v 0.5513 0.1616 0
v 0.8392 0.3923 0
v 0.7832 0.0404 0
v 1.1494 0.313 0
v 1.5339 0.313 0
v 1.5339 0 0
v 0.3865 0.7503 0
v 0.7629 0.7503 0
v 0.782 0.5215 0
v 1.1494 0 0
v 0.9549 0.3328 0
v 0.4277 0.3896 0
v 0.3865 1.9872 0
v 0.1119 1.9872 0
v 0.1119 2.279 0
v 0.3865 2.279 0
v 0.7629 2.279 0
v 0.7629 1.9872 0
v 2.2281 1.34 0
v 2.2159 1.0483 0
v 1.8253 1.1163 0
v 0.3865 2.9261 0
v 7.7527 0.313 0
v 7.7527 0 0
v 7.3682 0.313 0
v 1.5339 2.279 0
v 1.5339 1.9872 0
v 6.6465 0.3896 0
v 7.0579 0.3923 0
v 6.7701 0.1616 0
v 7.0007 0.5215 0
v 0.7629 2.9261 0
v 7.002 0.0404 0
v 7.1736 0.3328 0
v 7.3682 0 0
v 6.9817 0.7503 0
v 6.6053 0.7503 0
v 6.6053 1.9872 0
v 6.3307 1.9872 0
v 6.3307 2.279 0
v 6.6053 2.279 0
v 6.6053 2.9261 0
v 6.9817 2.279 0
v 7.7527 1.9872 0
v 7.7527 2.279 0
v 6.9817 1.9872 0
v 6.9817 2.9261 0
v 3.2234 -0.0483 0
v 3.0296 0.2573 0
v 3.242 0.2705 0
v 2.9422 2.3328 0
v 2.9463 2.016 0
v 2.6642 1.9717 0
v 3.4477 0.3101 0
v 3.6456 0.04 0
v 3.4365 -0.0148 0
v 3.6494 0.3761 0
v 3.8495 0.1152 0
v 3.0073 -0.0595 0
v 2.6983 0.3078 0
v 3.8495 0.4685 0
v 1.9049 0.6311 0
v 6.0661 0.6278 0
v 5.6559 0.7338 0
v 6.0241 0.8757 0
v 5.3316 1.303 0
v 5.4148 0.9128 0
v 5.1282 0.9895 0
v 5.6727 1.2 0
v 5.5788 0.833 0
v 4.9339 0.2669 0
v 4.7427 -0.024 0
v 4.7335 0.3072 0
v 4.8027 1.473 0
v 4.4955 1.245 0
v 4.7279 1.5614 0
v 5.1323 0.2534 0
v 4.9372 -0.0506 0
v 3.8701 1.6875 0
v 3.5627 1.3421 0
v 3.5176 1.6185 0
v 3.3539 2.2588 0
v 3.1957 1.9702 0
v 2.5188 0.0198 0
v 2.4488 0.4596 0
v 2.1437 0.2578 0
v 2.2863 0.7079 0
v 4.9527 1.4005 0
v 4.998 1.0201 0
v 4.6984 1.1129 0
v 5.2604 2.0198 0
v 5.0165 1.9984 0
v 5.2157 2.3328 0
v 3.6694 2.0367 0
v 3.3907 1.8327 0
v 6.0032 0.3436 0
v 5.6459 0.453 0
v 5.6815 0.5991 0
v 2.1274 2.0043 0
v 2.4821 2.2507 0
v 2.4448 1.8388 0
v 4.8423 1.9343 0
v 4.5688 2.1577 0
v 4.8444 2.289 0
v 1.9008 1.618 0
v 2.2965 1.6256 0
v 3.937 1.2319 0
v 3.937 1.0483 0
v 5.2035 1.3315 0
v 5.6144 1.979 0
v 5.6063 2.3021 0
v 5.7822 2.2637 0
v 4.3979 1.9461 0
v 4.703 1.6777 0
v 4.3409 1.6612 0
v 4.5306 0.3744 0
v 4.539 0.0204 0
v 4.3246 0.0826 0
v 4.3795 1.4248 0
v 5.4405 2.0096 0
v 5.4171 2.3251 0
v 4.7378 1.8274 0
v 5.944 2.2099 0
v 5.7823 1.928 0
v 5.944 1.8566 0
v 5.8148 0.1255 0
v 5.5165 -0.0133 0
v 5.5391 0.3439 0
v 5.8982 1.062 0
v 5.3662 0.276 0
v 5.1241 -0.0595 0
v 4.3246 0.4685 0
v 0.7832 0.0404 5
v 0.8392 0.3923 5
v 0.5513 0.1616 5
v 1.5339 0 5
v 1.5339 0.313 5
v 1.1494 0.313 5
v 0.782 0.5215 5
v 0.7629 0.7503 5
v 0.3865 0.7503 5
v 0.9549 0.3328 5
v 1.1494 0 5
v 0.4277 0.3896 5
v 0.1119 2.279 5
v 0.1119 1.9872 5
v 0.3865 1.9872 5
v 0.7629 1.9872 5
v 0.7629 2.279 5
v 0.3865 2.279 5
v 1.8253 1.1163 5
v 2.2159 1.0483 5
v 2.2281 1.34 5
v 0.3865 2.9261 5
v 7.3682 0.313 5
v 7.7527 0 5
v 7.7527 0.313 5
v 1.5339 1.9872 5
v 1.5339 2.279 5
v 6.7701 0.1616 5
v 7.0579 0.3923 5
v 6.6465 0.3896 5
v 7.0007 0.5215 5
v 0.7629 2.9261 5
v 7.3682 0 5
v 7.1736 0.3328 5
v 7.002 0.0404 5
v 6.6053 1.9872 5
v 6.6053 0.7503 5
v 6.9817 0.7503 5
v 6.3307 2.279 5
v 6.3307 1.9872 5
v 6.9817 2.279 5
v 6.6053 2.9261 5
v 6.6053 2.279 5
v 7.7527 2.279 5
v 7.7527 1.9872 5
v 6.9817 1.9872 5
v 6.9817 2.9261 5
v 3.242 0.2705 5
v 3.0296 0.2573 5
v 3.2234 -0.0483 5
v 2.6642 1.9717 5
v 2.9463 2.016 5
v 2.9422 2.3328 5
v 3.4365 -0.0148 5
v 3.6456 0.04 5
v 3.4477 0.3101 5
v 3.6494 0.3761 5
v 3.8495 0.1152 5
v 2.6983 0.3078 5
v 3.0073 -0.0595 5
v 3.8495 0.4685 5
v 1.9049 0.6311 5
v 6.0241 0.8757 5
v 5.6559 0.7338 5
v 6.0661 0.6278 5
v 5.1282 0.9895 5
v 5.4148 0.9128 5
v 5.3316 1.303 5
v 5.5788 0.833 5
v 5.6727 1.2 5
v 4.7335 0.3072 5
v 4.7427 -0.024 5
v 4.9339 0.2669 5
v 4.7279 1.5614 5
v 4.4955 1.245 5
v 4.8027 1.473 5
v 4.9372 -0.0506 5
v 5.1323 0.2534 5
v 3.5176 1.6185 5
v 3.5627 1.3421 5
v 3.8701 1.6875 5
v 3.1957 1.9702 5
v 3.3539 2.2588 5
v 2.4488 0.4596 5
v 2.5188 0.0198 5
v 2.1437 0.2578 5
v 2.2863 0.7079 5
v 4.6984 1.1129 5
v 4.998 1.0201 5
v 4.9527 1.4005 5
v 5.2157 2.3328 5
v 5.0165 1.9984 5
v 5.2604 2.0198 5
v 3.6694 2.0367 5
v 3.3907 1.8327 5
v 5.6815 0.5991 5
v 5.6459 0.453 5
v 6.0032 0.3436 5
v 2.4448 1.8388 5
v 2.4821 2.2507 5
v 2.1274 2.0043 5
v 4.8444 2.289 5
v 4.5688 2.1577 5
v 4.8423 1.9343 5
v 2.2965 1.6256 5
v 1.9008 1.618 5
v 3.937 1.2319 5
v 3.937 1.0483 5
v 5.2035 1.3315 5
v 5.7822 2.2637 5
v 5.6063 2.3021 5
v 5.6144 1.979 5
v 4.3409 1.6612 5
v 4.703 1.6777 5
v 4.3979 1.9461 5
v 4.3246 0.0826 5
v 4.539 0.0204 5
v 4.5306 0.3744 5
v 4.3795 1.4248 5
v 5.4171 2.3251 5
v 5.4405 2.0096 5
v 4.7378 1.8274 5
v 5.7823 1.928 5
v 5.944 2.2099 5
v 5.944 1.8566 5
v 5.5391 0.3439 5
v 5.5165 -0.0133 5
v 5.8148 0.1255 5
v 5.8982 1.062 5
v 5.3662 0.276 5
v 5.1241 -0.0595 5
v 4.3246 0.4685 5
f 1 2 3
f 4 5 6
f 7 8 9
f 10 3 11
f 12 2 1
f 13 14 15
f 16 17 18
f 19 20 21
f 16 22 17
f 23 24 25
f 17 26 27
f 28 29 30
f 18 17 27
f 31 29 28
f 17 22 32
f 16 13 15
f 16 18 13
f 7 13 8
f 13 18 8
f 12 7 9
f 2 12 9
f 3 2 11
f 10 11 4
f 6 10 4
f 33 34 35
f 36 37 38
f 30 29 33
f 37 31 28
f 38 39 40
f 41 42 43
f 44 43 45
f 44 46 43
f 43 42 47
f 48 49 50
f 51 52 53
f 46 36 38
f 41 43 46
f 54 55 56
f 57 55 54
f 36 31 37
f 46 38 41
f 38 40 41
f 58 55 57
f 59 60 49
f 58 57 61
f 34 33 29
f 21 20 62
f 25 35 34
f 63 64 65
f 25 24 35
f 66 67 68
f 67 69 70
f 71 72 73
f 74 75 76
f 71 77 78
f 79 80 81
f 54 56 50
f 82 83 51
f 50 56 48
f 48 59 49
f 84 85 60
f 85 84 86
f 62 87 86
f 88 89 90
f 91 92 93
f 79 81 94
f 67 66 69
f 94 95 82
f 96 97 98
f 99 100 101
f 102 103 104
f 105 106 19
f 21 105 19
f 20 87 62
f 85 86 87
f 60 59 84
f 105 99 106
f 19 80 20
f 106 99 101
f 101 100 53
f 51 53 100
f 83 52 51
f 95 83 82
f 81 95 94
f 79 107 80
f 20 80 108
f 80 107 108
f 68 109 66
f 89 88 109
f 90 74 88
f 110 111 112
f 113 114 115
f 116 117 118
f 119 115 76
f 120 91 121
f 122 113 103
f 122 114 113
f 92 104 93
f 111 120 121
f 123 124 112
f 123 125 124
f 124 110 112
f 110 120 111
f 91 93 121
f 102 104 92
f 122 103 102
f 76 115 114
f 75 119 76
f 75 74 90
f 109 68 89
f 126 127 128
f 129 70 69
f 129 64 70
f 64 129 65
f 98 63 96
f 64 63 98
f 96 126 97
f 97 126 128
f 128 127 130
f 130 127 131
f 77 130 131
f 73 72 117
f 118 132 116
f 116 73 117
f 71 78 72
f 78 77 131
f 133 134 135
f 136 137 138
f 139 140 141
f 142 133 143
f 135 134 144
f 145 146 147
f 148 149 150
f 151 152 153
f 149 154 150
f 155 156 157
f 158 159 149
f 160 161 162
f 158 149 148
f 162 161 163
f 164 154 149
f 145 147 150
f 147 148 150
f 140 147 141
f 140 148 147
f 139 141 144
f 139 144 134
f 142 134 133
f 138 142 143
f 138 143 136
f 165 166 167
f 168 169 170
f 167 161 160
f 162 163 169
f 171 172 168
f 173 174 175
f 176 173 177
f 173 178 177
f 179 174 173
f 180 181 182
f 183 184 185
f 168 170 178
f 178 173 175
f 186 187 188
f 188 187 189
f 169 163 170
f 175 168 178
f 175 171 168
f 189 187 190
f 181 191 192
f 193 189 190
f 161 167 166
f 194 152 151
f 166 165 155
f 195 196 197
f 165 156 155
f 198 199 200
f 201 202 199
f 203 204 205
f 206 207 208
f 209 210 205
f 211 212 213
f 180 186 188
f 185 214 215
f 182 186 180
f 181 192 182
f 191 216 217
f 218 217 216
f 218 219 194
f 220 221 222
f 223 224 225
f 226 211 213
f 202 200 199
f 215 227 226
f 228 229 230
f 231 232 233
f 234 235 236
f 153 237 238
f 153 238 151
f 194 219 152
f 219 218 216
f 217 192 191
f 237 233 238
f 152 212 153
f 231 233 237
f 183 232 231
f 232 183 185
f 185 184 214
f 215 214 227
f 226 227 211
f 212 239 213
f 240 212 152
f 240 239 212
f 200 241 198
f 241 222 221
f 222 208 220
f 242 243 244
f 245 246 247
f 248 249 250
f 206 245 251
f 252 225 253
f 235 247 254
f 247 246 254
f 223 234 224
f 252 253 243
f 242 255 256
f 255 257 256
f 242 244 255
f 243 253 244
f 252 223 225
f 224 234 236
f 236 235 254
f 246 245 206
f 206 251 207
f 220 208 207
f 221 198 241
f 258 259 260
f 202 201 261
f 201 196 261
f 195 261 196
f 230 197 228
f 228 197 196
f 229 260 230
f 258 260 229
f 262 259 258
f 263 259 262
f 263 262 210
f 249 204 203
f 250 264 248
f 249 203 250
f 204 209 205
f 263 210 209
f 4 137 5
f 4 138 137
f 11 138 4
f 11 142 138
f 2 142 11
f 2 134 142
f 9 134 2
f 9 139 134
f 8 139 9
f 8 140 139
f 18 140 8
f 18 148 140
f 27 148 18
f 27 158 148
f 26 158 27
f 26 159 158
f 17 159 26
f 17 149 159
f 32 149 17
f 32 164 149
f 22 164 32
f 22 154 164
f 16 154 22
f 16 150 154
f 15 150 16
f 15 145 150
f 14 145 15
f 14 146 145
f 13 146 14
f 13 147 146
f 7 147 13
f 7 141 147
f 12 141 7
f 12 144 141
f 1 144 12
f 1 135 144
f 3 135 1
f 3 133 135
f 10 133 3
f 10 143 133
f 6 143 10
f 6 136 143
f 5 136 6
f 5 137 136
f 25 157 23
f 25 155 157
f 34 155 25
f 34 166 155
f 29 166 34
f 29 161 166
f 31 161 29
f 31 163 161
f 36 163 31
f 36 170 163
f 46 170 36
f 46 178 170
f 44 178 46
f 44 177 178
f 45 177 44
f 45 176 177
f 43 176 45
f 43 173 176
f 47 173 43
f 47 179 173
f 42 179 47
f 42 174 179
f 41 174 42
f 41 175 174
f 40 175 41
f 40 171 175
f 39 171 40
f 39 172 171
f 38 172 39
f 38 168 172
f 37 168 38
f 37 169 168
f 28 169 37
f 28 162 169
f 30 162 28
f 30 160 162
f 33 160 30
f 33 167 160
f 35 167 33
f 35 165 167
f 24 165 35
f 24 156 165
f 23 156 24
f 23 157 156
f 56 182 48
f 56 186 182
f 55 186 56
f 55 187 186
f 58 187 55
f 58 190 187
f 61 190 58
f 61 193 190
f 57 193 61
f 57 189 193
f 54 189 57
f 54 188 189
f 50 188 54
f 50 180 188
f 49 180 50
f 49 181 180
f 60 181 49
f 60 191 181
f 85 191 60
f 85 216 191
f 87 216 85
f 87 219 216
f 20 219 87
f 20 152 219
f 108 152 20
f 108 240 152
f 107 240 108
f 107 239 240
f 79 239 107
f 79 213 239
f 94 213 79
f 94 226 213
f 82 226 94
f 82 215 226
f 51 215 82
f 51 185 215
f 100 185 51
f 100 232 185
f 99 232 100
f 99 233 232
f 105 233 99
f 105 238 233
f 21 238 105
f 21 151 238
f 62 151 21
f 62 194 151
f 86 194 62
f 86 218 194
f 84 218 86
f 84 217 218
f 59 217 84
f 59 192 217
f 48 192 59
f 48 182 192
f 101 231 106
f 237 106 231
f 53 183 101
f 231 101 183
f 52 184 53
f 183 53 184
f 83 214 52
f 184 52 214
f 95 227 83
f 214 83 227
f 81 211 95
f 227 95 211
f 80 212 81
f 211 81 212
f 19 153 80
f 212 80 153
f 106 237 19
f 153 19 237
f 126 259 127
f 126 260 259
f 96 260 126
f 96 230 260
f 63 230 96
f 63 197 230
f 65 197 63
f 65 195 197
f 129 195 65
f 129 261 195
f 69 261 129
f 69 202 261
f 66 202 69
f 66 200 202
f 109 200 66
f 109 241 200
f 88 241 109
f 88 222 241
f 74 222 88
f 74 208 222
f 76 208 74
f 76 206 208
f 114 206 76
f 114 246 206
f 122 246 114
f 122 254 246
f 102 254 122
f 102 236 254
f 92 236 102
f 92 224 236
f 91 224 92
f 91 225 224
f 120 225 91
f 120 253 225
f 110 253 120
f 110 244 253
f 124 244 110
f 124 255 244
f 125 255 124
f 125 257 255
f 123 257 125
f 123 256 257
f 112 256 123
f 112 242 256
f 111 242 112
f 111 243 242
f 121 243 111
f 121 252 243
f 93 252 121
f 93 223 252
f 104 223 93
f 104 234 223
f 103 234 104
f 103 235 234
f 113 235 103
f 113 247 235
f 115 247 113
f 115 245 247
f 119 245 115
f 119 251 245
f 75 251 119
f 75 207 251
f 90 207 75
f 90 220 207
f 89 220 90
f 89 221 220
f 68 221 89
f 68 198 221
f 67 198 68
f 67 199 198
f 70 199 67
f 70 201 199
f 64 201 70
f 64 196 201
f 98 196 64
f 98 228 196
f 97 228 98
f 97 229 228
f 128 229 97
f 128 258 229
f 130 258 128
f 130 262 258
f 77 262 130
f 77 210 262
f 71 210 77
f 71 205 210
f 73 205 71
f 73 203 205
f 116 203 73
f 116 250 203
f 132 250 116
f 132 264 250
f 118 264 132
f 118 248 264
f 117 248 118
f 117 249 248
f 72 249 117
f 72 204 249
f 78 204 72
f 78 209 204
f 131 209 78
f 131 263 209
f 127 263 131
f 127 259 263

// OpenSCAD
texte_a_inserer = "test"; 
taille = 3; 
police = "DejaVuSans"; //[[Abril Fatface,Aclonica,Acme,Advent Pro,Akronim,Aladin,Alegreya,Alegreya Sans,Alegreya SC,Alex Brush,Alfa Slab One,Alice,Amaranth,Architects Daughter,Archivo Black,Archivo Narrow,Arimo,Arvo,Asap,Astloch,Asul,Averia Libre,Averia Serif Libre,Bangers,Basic,Belgrano,Berkshire Swash,Bigshot One,Bilbo Swash Caps,Black Ops One,Bonbon,Bowlby One SC,Brawler,Bubblegum Sans,Butterfly Kids,Cabin Condensed,Caesar Dressing,Cagliostro,Calligraffitti,Capriola,Carter One,Changa One,Chango,Chelsea Market,Cherry Cream Soda,Chewy,Chicle,Chivo,Clicker Script,Coming Soon,Concert One,Condiment,Cookie,Courgette,Covered By Your Grace,Crimson Text,Dancing Script,DejaVu Sans,DejaVu Serif,Dhurjati,Doppio One,Dosis,Droid Sans,Eagle Lake,Electrolize,Emilys Candy,Encode Sans,Encode Sans Compressed,Euphoria Script,Exo,Exo 2,Faster One,Federo,Finger Paint,Fjord One,Fontdiner Swanky,Freckle Face,Fruktur,Gabriela,Geo,Germania One,Give You Glory,Gloria Hallelujah,Goudy Bookletter 1911,Graduate,Grand Hotel,Great Vibes,Griffy,Hanalei Fill,Happy Monkey,Henny Penny,Hind,IM Fell English SC,Indie Flower,Irish Grover,Italianno,Jacques Francois Shadow,Jolly Lodger,Josefin Slab,Joti One,Judson,Just Another Hand,Kalam,Kameron,Karma,Kavoon,Knewave,Kranky,Kristi,Laila,Lakki Reddy,Lancelot,Lato,Leckerli One,Ledger,Lekton,Lemon One,Liberation Sans,Libre Caslon Text,Life Savers,Lilita One,Lily Script One,Limelight,Lobster,Lobster Two,Londrina Outline,Londrina Shadow,Londrina Solid,Lora,Love Ya Like A Sister,Loved by the King,Lovers Quarrel,Luckiest Guy,Lusitana,Macondo,Macondo Swash Caps,Mako,Marck Script,Margarine,Marko One,Maven Pro,McLaren,MedievalSharp,Merienda One,Merriweather,Mervale Script,Metal Mania,Metrophobic,Milonga,Miltonian Tattoo,Miss Fajardose,Molle,Montez,Montserrat,Mr De Haviland,Mystery Quest,Neucha,New Rocker,Niconne,Nosifer,Nothing You Could Do,Noto Sans Oriya,Noto Serif,Nova Square,Nunito,Old Standard TT,Oleo Script,Oleo Script Swash Caps,Orbitron,Oregano,Orienta,Original Surfer,Oswald,Over the Rainbow,Overlock,Oxygen,Pacifico,Paprika,Parisienne,Patrick Hand SC,Paytone One,Peralta,Permanent Marker,Piedra,Pirata One,Play,Playball,Poetsen One,Poppins,Press Start 2P,Princess Sofia,PT Mono,Qwigley,Racing Sans One,Raleway,Rancho,Ranga,Ribeye,Roboto,Roboto Condensed,Roboto Slab,Rochester,Rock Salt,Rubik One,Sail,Salsa,Sansita One,Sarina,Satisfy,Schoolbell,Seaweed Script,Sevillana,Shadows Into Light,Shadows Into Light Two,Share,Six Caps,Skranji,Source Sans Pro,Spicy Rice,Stardos Stencil,Stoke,Syncopate,Teko,Terminal Dosis,The Girl Next Door,Tillana,Timmana,Titillium Web,Ubuntu,Ultra,Underdog,UnifrakturCook,UnifrakturMaguntia,Vampiro One,Vidaloka,Viga,Voces,Volkhov,Vollkorn,Voltaire,Waiting for the Sunrise,Wallpoet,Wellfleet,Wendy One,Yellowtail,Yesteryear,Zeyada]]
hauteur = 5; 
module rendu(){
linear_extrude(hauteur) text(texte_a_inserer,size = taille, font = police);
}
rendu();
 
